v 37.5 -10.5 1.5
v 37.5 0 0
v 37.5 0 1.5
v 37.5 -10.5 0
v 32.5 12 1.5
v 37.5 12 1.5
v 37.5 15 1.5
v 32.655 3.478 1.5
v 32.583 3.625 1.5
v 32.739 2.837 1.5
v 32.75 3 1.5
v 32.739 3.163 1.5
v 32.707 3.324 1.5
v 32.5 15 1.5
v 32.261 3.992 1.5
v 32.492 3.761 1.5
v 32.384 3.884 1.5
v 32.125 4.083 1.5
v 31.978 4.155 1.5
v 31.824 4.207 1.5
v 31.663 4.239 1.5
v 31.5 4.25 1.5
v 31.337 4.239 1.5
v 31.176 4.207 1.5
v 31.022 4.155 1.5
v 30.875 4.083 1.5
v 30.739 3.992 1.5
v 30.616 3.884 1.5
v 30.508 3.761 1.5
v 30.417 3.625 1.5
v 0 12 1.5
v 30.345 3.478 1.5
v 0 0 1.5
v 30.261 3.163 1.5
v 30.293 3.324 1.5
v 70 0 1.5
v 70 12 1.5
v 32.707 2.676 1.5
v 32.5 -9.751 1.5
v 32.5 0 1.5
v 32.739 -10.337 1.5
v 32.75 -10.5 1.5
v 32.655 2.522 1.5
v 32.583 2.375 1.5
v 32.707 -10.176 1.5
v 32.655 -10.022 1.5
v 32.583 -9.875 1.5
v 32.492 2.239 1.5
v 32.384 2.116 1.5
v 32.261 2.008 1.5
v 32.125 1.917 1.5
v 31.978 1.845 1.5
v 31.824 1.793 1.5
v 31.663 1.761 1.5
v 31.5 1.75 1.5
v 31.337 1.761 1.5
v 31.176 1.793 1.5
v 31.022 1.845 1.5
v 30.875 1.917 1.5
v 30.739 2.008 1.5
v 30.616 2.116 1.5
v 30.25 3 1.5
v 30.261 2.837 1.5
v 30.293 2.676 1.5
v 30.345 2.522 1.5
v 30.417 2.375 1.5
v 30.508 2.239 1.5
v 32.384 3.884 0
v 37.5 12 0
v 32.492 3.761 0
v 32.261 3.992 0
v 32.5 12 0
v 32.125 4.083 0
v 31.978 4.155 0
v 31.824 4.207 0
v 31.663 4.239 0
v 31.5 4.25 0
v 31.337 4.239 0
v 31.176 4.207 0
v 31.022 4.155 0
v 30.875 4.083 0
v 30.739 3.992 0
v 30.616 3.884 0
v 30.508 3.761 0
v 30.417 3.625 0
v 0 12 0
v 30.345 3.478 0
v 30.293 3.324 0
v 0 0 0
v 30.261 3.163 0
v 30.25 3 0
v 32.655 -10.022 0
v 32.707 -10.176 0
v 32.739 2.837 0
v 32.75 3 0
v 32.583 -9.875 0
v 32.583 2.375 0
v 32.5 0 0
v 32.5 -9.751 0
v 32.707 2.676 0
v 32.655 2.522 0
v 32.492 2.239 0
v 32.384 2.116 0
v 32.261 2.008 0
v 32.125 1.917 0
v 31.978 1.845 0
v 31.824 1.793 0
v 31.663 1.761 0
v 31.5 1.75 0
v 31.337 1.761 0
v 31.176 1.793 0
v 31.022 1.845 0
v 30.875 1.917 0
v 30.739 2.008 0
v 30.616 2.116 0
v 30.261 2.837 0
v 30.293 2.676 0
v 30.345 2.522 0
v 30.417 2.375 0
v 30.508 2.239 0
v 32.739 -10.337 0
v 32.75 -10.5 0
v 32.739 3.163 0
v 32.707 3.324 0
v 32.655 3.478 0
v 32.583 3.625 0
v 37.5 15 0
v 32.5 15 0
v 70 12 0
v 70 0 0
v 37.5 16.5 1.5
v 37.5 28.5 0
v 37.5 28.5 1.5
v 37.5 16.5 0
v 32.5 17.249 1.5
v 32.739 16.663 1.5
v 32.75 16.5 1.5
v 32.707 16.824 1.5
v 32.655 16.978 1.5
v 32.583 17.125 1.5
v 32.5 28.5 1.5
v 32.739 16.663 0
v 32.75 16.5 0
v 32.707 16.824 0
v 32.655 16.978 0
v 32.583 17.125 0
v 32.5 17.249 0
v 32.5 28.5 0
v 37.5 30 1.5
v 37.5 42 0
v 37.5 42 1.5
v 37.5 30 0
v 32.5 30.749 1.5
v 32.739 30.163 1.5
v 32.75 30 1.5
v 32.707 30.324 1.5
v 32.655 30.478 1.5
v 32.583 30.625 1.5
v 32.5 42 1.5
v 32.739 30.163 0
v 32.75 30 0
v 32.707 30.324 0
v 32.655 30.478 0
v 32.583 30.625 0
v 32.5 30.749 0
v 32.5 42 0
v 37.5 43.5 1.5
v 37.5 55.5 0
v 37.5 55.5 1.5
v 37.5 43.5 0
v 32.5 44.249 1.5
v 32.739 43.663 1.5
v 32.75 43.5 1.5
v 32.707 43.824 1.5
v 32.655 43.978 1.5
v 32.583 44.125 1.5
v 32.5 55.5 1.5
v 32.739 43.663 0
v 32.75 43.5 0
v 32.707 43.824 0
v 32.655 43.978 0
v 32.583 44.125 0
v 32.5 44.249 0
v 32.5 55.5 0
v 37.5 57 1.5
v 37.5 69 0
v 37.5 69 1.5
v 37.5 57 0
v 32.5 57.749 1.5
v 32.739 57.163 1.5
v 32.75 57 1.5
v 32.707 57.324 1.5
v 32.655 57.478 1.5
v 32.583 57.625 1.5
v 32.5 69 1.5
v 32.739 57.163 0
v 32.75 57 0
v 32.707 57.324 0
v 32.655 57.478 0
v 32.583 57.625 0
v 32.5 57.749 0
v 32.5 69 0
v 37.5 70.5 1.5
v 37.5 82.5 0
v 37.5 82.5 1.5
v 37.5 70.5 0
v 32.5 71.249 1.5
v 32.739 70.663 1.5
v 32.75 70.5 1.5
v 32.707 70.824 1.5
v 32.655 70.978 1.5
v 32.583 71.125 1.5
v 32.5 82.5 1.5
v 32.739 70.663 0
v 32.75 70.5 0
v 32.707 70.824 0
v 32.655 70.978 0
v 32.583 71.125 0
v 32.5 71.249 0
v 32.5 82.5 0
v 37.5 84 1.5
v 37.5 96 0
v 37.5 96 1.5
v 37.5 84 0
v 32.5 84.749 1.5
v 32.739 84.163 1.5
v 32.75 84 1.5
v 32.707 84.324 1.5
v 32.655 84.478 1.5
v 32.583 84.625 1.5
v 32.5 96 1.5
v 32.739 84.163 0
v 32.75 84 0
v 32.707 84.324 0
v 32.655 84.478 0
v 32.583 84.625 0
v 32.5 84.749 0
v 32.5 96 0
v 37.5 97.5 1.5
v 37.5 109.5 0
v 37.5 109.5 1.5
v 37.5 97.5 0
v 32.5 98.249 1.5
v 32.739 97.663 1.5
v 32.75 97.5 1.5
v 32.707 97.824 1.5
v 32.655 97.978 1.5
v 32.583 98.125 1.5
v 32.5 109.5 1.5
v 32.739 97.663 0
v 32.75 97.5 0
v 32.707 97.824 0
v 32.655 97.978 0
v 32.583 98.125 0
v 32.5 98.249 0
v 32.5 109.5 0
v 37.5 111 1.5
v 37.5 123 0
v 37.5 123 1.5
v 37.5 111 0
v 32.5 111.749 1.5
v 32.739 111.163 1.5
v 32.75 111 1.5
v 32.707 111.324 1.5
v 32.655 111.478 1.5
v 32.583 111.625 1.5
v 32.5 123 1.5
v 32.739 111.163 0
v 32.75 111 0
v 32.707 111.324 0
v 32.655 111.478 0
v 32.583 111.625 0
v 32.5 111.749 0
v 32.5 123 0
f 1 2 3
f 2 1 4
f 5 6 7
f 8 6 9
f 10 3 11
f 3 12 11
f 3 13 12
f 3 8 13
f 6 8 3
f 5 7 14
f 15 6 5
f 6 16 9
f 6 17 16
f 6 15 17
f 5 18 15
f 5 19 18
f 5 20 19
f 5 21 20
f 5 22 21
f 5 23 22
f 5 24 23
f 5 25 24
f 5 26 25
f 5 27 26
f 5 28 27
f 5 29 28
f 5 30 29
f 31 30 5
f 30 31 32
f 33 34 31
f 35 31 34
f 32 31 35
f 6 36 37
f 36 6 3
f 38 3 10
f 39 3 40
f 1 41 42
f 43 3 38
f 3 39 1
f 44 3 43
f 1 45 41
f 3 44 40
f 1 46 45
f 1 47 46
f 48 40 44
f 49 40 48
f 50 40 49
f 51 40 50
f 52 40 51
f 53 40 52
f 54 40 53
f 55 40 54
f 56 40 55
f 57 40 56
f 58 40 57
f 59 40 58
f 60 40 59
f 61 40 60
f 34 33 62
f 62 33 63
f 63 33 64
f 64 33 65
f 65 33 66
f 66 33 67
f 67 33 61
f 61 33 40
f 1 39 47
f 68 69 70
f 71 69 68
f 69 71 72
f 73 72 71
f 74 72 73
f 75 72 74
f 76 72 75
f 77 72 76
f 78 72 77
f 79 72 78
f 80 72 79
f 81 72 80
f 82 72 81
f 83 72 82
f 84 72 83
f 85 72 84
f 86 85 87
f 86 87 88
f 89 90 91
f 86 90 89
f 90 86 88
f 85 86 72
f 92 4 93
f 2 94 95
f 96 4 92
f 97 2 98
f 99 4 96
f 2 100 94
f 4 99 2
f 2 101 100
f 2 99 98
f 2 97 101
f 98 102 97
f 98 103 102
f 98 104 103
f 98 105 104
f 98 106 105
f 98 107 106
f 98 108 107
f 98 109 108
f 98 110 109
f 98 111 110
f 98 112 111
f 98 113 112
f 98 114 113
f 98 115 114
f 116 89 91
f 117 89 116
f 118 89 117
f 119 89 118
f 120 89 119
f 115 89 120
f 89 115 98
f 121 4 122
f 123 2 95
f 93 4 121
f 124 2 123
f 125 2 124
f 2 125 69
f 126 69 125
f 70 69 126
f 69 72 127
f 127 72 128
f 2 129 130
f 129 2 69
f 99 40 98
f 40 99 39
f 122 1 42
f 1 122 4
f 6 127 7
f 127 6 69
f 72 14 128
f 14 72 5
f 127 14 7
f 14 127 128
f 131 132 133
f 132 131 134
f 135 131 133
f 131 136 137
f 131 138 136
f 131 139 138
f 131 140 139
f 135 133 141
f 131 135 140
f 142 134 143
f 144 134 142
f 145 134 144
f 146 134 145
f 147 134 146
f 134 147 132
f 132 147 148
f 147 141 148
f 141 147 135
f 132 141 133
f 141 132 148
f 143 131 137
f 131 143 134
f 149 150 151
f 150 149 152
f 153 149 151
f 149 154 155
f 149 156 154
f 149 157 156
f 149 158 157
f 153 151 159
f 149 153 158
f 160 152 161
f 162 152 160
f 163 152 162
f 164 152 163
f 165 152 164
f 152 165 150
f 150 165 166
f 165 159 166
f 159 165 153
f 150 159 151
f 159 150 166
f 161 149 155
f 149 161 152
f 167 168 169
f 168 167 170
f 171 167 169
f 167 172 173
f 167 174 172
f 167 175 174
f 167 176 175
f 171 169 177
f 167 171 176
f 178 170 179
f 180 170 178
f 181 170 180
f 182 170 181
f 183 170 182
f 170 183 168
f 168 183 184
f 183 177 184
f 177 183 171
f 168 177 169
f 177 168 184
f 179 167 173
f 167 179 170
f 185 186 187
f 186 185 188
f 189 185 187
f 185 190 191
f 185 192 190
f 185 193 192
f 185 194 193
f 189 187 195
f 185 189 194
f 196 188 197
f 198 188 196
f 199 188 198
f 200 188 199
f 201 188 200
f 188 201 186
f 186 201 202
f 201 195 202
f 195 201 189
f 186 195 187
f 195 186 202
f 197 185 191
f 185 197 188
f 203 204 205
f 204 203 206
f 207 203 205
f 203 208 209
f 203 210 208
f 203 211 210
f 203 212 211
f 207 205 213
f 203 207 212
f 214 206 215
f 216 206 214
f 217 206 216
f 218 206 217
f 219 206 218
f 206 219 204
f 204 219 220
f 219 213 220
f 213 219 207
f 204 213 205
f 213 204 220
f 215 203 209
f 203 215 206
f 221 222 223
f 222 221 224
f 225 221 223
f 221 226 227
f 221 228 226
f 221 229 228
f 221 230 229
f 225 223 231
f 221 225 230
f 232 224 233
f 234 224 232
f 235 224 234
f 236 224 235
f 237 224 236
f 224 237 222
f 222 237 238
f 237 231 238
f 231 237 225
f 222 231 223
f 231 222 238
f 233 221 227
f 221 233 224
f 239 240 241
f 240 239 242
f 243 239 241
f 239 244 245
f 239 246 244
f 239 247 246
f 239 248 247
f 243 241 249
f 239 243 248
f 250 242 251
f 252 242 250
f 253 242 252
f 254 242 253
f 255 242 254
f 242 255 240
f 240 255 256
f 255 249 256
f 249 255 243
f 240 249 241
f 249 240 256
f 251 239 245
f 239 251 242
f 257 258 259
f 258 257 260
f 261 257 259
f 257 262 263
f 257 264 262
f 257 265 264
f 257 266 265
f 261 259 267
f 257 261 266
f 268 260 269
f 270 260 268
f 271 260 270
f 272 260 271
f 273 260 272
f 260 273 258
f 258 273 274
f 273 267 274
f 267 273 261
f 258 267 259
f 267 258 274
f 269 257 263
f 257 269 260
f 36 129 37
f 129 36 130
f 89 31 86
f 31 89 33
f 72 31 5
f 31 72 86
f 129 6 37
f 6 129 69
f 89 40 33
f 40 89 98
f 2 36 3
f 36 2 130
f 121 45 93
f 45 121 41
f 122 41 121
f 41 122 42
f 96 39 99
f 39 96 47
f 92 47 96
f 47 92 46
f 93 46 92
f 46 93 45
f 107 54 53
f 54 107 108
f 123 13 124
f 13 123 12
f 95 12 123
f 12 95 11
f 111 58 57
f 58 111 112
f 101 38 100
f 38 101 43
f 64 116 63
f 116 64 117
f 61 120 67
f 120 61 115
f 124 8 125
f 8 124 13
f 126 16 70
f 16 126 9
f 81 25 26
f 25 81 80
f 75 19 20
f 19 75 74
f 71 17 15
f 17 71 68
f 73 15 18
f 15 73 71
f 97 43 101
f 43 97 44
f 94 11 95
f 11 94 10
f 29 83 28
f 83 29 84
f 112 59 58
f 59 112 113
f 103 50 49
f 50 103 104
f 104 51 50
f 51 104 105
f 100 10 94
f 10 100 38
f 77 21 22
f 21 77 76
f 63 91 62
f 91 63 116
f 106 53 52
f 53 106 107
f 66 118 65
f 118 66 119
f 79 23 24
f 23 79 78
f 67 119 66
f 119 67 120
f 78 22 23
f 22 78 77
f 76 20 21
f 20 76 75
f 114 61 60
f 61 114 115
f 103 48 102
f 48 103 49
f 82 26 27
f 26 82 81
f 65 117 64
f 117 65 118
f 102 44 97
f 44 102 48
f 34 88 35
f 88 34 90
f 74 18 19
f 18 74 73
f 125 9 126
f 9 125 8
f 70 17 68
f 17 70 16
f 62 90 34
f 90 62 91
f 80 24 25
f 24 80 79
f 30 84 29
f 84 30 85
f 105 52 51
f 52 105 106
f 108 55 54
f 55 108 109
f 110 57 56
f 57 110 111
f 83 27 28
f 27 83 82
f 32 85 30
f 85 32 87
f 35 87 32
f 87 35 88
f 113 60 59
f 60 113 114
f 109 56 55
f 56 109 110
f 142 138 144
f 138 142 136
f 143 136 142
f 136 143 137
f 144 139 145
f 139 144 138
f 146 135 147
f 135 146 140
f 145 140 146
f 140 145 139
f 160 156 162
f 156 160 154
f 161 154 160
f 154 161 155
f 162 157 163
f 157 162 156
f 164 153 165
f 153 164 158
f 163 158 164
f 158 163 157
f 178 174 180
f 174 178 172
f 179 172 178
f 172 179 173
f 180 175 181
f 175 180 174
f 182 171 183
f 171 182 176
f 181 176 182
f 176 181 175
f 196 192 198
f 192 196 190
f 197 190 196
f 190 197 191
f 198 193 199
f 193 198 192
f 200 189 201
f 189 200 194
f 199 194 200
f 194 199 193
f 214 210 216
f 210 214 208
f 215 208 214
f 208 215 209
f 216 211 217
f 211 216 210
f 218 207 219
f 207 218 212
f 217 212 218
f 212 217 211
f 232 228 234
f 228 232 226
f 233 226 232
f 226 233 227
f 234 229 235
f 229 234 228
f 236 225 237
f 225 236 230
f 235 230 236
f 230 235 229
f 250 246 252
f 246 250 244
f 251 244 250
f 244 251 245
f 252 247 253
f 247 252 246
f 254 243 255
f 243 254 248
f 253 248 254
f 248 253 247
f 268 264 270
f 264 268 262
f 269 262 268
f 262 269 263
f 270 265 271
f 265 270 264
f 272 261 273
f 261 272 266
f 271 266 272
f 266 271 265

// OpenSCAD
// Gel comb for agarose casting - a flat plate with a straight back bar and 10 hanging
// rectangular teeth. NOVEL general part.
//

plate  = 70;
spine  = 12;
teeth  = 10;
tooth_w= 5;
tooth_l= 12;
gap    = 1.5;
t      = 1.5;

$fn = 48;

back_bore = min(3, tooth_w / 2);              // keep the teeth linked if t is very small

difference() {
    union() {
        cube([plate, spine, t]);                  // plate
        for (i = [0 : teeth - 1])
            translate([plate / 2 - tooth_w / 2, -spine + gap + i * (tooth_l + gap), 0])
                cube([tooth_w, tooth_l, t]);     // teeth
    }
    for (i = [0 : teeth - 1])
        translate([plate / 2 - tooth_w / 2 - 1, -spine + gap + i * (tooth_l + gap), -1])
            cylinder(h = t + 2, d = back_bore);   // link the teeth to the back bar
}
